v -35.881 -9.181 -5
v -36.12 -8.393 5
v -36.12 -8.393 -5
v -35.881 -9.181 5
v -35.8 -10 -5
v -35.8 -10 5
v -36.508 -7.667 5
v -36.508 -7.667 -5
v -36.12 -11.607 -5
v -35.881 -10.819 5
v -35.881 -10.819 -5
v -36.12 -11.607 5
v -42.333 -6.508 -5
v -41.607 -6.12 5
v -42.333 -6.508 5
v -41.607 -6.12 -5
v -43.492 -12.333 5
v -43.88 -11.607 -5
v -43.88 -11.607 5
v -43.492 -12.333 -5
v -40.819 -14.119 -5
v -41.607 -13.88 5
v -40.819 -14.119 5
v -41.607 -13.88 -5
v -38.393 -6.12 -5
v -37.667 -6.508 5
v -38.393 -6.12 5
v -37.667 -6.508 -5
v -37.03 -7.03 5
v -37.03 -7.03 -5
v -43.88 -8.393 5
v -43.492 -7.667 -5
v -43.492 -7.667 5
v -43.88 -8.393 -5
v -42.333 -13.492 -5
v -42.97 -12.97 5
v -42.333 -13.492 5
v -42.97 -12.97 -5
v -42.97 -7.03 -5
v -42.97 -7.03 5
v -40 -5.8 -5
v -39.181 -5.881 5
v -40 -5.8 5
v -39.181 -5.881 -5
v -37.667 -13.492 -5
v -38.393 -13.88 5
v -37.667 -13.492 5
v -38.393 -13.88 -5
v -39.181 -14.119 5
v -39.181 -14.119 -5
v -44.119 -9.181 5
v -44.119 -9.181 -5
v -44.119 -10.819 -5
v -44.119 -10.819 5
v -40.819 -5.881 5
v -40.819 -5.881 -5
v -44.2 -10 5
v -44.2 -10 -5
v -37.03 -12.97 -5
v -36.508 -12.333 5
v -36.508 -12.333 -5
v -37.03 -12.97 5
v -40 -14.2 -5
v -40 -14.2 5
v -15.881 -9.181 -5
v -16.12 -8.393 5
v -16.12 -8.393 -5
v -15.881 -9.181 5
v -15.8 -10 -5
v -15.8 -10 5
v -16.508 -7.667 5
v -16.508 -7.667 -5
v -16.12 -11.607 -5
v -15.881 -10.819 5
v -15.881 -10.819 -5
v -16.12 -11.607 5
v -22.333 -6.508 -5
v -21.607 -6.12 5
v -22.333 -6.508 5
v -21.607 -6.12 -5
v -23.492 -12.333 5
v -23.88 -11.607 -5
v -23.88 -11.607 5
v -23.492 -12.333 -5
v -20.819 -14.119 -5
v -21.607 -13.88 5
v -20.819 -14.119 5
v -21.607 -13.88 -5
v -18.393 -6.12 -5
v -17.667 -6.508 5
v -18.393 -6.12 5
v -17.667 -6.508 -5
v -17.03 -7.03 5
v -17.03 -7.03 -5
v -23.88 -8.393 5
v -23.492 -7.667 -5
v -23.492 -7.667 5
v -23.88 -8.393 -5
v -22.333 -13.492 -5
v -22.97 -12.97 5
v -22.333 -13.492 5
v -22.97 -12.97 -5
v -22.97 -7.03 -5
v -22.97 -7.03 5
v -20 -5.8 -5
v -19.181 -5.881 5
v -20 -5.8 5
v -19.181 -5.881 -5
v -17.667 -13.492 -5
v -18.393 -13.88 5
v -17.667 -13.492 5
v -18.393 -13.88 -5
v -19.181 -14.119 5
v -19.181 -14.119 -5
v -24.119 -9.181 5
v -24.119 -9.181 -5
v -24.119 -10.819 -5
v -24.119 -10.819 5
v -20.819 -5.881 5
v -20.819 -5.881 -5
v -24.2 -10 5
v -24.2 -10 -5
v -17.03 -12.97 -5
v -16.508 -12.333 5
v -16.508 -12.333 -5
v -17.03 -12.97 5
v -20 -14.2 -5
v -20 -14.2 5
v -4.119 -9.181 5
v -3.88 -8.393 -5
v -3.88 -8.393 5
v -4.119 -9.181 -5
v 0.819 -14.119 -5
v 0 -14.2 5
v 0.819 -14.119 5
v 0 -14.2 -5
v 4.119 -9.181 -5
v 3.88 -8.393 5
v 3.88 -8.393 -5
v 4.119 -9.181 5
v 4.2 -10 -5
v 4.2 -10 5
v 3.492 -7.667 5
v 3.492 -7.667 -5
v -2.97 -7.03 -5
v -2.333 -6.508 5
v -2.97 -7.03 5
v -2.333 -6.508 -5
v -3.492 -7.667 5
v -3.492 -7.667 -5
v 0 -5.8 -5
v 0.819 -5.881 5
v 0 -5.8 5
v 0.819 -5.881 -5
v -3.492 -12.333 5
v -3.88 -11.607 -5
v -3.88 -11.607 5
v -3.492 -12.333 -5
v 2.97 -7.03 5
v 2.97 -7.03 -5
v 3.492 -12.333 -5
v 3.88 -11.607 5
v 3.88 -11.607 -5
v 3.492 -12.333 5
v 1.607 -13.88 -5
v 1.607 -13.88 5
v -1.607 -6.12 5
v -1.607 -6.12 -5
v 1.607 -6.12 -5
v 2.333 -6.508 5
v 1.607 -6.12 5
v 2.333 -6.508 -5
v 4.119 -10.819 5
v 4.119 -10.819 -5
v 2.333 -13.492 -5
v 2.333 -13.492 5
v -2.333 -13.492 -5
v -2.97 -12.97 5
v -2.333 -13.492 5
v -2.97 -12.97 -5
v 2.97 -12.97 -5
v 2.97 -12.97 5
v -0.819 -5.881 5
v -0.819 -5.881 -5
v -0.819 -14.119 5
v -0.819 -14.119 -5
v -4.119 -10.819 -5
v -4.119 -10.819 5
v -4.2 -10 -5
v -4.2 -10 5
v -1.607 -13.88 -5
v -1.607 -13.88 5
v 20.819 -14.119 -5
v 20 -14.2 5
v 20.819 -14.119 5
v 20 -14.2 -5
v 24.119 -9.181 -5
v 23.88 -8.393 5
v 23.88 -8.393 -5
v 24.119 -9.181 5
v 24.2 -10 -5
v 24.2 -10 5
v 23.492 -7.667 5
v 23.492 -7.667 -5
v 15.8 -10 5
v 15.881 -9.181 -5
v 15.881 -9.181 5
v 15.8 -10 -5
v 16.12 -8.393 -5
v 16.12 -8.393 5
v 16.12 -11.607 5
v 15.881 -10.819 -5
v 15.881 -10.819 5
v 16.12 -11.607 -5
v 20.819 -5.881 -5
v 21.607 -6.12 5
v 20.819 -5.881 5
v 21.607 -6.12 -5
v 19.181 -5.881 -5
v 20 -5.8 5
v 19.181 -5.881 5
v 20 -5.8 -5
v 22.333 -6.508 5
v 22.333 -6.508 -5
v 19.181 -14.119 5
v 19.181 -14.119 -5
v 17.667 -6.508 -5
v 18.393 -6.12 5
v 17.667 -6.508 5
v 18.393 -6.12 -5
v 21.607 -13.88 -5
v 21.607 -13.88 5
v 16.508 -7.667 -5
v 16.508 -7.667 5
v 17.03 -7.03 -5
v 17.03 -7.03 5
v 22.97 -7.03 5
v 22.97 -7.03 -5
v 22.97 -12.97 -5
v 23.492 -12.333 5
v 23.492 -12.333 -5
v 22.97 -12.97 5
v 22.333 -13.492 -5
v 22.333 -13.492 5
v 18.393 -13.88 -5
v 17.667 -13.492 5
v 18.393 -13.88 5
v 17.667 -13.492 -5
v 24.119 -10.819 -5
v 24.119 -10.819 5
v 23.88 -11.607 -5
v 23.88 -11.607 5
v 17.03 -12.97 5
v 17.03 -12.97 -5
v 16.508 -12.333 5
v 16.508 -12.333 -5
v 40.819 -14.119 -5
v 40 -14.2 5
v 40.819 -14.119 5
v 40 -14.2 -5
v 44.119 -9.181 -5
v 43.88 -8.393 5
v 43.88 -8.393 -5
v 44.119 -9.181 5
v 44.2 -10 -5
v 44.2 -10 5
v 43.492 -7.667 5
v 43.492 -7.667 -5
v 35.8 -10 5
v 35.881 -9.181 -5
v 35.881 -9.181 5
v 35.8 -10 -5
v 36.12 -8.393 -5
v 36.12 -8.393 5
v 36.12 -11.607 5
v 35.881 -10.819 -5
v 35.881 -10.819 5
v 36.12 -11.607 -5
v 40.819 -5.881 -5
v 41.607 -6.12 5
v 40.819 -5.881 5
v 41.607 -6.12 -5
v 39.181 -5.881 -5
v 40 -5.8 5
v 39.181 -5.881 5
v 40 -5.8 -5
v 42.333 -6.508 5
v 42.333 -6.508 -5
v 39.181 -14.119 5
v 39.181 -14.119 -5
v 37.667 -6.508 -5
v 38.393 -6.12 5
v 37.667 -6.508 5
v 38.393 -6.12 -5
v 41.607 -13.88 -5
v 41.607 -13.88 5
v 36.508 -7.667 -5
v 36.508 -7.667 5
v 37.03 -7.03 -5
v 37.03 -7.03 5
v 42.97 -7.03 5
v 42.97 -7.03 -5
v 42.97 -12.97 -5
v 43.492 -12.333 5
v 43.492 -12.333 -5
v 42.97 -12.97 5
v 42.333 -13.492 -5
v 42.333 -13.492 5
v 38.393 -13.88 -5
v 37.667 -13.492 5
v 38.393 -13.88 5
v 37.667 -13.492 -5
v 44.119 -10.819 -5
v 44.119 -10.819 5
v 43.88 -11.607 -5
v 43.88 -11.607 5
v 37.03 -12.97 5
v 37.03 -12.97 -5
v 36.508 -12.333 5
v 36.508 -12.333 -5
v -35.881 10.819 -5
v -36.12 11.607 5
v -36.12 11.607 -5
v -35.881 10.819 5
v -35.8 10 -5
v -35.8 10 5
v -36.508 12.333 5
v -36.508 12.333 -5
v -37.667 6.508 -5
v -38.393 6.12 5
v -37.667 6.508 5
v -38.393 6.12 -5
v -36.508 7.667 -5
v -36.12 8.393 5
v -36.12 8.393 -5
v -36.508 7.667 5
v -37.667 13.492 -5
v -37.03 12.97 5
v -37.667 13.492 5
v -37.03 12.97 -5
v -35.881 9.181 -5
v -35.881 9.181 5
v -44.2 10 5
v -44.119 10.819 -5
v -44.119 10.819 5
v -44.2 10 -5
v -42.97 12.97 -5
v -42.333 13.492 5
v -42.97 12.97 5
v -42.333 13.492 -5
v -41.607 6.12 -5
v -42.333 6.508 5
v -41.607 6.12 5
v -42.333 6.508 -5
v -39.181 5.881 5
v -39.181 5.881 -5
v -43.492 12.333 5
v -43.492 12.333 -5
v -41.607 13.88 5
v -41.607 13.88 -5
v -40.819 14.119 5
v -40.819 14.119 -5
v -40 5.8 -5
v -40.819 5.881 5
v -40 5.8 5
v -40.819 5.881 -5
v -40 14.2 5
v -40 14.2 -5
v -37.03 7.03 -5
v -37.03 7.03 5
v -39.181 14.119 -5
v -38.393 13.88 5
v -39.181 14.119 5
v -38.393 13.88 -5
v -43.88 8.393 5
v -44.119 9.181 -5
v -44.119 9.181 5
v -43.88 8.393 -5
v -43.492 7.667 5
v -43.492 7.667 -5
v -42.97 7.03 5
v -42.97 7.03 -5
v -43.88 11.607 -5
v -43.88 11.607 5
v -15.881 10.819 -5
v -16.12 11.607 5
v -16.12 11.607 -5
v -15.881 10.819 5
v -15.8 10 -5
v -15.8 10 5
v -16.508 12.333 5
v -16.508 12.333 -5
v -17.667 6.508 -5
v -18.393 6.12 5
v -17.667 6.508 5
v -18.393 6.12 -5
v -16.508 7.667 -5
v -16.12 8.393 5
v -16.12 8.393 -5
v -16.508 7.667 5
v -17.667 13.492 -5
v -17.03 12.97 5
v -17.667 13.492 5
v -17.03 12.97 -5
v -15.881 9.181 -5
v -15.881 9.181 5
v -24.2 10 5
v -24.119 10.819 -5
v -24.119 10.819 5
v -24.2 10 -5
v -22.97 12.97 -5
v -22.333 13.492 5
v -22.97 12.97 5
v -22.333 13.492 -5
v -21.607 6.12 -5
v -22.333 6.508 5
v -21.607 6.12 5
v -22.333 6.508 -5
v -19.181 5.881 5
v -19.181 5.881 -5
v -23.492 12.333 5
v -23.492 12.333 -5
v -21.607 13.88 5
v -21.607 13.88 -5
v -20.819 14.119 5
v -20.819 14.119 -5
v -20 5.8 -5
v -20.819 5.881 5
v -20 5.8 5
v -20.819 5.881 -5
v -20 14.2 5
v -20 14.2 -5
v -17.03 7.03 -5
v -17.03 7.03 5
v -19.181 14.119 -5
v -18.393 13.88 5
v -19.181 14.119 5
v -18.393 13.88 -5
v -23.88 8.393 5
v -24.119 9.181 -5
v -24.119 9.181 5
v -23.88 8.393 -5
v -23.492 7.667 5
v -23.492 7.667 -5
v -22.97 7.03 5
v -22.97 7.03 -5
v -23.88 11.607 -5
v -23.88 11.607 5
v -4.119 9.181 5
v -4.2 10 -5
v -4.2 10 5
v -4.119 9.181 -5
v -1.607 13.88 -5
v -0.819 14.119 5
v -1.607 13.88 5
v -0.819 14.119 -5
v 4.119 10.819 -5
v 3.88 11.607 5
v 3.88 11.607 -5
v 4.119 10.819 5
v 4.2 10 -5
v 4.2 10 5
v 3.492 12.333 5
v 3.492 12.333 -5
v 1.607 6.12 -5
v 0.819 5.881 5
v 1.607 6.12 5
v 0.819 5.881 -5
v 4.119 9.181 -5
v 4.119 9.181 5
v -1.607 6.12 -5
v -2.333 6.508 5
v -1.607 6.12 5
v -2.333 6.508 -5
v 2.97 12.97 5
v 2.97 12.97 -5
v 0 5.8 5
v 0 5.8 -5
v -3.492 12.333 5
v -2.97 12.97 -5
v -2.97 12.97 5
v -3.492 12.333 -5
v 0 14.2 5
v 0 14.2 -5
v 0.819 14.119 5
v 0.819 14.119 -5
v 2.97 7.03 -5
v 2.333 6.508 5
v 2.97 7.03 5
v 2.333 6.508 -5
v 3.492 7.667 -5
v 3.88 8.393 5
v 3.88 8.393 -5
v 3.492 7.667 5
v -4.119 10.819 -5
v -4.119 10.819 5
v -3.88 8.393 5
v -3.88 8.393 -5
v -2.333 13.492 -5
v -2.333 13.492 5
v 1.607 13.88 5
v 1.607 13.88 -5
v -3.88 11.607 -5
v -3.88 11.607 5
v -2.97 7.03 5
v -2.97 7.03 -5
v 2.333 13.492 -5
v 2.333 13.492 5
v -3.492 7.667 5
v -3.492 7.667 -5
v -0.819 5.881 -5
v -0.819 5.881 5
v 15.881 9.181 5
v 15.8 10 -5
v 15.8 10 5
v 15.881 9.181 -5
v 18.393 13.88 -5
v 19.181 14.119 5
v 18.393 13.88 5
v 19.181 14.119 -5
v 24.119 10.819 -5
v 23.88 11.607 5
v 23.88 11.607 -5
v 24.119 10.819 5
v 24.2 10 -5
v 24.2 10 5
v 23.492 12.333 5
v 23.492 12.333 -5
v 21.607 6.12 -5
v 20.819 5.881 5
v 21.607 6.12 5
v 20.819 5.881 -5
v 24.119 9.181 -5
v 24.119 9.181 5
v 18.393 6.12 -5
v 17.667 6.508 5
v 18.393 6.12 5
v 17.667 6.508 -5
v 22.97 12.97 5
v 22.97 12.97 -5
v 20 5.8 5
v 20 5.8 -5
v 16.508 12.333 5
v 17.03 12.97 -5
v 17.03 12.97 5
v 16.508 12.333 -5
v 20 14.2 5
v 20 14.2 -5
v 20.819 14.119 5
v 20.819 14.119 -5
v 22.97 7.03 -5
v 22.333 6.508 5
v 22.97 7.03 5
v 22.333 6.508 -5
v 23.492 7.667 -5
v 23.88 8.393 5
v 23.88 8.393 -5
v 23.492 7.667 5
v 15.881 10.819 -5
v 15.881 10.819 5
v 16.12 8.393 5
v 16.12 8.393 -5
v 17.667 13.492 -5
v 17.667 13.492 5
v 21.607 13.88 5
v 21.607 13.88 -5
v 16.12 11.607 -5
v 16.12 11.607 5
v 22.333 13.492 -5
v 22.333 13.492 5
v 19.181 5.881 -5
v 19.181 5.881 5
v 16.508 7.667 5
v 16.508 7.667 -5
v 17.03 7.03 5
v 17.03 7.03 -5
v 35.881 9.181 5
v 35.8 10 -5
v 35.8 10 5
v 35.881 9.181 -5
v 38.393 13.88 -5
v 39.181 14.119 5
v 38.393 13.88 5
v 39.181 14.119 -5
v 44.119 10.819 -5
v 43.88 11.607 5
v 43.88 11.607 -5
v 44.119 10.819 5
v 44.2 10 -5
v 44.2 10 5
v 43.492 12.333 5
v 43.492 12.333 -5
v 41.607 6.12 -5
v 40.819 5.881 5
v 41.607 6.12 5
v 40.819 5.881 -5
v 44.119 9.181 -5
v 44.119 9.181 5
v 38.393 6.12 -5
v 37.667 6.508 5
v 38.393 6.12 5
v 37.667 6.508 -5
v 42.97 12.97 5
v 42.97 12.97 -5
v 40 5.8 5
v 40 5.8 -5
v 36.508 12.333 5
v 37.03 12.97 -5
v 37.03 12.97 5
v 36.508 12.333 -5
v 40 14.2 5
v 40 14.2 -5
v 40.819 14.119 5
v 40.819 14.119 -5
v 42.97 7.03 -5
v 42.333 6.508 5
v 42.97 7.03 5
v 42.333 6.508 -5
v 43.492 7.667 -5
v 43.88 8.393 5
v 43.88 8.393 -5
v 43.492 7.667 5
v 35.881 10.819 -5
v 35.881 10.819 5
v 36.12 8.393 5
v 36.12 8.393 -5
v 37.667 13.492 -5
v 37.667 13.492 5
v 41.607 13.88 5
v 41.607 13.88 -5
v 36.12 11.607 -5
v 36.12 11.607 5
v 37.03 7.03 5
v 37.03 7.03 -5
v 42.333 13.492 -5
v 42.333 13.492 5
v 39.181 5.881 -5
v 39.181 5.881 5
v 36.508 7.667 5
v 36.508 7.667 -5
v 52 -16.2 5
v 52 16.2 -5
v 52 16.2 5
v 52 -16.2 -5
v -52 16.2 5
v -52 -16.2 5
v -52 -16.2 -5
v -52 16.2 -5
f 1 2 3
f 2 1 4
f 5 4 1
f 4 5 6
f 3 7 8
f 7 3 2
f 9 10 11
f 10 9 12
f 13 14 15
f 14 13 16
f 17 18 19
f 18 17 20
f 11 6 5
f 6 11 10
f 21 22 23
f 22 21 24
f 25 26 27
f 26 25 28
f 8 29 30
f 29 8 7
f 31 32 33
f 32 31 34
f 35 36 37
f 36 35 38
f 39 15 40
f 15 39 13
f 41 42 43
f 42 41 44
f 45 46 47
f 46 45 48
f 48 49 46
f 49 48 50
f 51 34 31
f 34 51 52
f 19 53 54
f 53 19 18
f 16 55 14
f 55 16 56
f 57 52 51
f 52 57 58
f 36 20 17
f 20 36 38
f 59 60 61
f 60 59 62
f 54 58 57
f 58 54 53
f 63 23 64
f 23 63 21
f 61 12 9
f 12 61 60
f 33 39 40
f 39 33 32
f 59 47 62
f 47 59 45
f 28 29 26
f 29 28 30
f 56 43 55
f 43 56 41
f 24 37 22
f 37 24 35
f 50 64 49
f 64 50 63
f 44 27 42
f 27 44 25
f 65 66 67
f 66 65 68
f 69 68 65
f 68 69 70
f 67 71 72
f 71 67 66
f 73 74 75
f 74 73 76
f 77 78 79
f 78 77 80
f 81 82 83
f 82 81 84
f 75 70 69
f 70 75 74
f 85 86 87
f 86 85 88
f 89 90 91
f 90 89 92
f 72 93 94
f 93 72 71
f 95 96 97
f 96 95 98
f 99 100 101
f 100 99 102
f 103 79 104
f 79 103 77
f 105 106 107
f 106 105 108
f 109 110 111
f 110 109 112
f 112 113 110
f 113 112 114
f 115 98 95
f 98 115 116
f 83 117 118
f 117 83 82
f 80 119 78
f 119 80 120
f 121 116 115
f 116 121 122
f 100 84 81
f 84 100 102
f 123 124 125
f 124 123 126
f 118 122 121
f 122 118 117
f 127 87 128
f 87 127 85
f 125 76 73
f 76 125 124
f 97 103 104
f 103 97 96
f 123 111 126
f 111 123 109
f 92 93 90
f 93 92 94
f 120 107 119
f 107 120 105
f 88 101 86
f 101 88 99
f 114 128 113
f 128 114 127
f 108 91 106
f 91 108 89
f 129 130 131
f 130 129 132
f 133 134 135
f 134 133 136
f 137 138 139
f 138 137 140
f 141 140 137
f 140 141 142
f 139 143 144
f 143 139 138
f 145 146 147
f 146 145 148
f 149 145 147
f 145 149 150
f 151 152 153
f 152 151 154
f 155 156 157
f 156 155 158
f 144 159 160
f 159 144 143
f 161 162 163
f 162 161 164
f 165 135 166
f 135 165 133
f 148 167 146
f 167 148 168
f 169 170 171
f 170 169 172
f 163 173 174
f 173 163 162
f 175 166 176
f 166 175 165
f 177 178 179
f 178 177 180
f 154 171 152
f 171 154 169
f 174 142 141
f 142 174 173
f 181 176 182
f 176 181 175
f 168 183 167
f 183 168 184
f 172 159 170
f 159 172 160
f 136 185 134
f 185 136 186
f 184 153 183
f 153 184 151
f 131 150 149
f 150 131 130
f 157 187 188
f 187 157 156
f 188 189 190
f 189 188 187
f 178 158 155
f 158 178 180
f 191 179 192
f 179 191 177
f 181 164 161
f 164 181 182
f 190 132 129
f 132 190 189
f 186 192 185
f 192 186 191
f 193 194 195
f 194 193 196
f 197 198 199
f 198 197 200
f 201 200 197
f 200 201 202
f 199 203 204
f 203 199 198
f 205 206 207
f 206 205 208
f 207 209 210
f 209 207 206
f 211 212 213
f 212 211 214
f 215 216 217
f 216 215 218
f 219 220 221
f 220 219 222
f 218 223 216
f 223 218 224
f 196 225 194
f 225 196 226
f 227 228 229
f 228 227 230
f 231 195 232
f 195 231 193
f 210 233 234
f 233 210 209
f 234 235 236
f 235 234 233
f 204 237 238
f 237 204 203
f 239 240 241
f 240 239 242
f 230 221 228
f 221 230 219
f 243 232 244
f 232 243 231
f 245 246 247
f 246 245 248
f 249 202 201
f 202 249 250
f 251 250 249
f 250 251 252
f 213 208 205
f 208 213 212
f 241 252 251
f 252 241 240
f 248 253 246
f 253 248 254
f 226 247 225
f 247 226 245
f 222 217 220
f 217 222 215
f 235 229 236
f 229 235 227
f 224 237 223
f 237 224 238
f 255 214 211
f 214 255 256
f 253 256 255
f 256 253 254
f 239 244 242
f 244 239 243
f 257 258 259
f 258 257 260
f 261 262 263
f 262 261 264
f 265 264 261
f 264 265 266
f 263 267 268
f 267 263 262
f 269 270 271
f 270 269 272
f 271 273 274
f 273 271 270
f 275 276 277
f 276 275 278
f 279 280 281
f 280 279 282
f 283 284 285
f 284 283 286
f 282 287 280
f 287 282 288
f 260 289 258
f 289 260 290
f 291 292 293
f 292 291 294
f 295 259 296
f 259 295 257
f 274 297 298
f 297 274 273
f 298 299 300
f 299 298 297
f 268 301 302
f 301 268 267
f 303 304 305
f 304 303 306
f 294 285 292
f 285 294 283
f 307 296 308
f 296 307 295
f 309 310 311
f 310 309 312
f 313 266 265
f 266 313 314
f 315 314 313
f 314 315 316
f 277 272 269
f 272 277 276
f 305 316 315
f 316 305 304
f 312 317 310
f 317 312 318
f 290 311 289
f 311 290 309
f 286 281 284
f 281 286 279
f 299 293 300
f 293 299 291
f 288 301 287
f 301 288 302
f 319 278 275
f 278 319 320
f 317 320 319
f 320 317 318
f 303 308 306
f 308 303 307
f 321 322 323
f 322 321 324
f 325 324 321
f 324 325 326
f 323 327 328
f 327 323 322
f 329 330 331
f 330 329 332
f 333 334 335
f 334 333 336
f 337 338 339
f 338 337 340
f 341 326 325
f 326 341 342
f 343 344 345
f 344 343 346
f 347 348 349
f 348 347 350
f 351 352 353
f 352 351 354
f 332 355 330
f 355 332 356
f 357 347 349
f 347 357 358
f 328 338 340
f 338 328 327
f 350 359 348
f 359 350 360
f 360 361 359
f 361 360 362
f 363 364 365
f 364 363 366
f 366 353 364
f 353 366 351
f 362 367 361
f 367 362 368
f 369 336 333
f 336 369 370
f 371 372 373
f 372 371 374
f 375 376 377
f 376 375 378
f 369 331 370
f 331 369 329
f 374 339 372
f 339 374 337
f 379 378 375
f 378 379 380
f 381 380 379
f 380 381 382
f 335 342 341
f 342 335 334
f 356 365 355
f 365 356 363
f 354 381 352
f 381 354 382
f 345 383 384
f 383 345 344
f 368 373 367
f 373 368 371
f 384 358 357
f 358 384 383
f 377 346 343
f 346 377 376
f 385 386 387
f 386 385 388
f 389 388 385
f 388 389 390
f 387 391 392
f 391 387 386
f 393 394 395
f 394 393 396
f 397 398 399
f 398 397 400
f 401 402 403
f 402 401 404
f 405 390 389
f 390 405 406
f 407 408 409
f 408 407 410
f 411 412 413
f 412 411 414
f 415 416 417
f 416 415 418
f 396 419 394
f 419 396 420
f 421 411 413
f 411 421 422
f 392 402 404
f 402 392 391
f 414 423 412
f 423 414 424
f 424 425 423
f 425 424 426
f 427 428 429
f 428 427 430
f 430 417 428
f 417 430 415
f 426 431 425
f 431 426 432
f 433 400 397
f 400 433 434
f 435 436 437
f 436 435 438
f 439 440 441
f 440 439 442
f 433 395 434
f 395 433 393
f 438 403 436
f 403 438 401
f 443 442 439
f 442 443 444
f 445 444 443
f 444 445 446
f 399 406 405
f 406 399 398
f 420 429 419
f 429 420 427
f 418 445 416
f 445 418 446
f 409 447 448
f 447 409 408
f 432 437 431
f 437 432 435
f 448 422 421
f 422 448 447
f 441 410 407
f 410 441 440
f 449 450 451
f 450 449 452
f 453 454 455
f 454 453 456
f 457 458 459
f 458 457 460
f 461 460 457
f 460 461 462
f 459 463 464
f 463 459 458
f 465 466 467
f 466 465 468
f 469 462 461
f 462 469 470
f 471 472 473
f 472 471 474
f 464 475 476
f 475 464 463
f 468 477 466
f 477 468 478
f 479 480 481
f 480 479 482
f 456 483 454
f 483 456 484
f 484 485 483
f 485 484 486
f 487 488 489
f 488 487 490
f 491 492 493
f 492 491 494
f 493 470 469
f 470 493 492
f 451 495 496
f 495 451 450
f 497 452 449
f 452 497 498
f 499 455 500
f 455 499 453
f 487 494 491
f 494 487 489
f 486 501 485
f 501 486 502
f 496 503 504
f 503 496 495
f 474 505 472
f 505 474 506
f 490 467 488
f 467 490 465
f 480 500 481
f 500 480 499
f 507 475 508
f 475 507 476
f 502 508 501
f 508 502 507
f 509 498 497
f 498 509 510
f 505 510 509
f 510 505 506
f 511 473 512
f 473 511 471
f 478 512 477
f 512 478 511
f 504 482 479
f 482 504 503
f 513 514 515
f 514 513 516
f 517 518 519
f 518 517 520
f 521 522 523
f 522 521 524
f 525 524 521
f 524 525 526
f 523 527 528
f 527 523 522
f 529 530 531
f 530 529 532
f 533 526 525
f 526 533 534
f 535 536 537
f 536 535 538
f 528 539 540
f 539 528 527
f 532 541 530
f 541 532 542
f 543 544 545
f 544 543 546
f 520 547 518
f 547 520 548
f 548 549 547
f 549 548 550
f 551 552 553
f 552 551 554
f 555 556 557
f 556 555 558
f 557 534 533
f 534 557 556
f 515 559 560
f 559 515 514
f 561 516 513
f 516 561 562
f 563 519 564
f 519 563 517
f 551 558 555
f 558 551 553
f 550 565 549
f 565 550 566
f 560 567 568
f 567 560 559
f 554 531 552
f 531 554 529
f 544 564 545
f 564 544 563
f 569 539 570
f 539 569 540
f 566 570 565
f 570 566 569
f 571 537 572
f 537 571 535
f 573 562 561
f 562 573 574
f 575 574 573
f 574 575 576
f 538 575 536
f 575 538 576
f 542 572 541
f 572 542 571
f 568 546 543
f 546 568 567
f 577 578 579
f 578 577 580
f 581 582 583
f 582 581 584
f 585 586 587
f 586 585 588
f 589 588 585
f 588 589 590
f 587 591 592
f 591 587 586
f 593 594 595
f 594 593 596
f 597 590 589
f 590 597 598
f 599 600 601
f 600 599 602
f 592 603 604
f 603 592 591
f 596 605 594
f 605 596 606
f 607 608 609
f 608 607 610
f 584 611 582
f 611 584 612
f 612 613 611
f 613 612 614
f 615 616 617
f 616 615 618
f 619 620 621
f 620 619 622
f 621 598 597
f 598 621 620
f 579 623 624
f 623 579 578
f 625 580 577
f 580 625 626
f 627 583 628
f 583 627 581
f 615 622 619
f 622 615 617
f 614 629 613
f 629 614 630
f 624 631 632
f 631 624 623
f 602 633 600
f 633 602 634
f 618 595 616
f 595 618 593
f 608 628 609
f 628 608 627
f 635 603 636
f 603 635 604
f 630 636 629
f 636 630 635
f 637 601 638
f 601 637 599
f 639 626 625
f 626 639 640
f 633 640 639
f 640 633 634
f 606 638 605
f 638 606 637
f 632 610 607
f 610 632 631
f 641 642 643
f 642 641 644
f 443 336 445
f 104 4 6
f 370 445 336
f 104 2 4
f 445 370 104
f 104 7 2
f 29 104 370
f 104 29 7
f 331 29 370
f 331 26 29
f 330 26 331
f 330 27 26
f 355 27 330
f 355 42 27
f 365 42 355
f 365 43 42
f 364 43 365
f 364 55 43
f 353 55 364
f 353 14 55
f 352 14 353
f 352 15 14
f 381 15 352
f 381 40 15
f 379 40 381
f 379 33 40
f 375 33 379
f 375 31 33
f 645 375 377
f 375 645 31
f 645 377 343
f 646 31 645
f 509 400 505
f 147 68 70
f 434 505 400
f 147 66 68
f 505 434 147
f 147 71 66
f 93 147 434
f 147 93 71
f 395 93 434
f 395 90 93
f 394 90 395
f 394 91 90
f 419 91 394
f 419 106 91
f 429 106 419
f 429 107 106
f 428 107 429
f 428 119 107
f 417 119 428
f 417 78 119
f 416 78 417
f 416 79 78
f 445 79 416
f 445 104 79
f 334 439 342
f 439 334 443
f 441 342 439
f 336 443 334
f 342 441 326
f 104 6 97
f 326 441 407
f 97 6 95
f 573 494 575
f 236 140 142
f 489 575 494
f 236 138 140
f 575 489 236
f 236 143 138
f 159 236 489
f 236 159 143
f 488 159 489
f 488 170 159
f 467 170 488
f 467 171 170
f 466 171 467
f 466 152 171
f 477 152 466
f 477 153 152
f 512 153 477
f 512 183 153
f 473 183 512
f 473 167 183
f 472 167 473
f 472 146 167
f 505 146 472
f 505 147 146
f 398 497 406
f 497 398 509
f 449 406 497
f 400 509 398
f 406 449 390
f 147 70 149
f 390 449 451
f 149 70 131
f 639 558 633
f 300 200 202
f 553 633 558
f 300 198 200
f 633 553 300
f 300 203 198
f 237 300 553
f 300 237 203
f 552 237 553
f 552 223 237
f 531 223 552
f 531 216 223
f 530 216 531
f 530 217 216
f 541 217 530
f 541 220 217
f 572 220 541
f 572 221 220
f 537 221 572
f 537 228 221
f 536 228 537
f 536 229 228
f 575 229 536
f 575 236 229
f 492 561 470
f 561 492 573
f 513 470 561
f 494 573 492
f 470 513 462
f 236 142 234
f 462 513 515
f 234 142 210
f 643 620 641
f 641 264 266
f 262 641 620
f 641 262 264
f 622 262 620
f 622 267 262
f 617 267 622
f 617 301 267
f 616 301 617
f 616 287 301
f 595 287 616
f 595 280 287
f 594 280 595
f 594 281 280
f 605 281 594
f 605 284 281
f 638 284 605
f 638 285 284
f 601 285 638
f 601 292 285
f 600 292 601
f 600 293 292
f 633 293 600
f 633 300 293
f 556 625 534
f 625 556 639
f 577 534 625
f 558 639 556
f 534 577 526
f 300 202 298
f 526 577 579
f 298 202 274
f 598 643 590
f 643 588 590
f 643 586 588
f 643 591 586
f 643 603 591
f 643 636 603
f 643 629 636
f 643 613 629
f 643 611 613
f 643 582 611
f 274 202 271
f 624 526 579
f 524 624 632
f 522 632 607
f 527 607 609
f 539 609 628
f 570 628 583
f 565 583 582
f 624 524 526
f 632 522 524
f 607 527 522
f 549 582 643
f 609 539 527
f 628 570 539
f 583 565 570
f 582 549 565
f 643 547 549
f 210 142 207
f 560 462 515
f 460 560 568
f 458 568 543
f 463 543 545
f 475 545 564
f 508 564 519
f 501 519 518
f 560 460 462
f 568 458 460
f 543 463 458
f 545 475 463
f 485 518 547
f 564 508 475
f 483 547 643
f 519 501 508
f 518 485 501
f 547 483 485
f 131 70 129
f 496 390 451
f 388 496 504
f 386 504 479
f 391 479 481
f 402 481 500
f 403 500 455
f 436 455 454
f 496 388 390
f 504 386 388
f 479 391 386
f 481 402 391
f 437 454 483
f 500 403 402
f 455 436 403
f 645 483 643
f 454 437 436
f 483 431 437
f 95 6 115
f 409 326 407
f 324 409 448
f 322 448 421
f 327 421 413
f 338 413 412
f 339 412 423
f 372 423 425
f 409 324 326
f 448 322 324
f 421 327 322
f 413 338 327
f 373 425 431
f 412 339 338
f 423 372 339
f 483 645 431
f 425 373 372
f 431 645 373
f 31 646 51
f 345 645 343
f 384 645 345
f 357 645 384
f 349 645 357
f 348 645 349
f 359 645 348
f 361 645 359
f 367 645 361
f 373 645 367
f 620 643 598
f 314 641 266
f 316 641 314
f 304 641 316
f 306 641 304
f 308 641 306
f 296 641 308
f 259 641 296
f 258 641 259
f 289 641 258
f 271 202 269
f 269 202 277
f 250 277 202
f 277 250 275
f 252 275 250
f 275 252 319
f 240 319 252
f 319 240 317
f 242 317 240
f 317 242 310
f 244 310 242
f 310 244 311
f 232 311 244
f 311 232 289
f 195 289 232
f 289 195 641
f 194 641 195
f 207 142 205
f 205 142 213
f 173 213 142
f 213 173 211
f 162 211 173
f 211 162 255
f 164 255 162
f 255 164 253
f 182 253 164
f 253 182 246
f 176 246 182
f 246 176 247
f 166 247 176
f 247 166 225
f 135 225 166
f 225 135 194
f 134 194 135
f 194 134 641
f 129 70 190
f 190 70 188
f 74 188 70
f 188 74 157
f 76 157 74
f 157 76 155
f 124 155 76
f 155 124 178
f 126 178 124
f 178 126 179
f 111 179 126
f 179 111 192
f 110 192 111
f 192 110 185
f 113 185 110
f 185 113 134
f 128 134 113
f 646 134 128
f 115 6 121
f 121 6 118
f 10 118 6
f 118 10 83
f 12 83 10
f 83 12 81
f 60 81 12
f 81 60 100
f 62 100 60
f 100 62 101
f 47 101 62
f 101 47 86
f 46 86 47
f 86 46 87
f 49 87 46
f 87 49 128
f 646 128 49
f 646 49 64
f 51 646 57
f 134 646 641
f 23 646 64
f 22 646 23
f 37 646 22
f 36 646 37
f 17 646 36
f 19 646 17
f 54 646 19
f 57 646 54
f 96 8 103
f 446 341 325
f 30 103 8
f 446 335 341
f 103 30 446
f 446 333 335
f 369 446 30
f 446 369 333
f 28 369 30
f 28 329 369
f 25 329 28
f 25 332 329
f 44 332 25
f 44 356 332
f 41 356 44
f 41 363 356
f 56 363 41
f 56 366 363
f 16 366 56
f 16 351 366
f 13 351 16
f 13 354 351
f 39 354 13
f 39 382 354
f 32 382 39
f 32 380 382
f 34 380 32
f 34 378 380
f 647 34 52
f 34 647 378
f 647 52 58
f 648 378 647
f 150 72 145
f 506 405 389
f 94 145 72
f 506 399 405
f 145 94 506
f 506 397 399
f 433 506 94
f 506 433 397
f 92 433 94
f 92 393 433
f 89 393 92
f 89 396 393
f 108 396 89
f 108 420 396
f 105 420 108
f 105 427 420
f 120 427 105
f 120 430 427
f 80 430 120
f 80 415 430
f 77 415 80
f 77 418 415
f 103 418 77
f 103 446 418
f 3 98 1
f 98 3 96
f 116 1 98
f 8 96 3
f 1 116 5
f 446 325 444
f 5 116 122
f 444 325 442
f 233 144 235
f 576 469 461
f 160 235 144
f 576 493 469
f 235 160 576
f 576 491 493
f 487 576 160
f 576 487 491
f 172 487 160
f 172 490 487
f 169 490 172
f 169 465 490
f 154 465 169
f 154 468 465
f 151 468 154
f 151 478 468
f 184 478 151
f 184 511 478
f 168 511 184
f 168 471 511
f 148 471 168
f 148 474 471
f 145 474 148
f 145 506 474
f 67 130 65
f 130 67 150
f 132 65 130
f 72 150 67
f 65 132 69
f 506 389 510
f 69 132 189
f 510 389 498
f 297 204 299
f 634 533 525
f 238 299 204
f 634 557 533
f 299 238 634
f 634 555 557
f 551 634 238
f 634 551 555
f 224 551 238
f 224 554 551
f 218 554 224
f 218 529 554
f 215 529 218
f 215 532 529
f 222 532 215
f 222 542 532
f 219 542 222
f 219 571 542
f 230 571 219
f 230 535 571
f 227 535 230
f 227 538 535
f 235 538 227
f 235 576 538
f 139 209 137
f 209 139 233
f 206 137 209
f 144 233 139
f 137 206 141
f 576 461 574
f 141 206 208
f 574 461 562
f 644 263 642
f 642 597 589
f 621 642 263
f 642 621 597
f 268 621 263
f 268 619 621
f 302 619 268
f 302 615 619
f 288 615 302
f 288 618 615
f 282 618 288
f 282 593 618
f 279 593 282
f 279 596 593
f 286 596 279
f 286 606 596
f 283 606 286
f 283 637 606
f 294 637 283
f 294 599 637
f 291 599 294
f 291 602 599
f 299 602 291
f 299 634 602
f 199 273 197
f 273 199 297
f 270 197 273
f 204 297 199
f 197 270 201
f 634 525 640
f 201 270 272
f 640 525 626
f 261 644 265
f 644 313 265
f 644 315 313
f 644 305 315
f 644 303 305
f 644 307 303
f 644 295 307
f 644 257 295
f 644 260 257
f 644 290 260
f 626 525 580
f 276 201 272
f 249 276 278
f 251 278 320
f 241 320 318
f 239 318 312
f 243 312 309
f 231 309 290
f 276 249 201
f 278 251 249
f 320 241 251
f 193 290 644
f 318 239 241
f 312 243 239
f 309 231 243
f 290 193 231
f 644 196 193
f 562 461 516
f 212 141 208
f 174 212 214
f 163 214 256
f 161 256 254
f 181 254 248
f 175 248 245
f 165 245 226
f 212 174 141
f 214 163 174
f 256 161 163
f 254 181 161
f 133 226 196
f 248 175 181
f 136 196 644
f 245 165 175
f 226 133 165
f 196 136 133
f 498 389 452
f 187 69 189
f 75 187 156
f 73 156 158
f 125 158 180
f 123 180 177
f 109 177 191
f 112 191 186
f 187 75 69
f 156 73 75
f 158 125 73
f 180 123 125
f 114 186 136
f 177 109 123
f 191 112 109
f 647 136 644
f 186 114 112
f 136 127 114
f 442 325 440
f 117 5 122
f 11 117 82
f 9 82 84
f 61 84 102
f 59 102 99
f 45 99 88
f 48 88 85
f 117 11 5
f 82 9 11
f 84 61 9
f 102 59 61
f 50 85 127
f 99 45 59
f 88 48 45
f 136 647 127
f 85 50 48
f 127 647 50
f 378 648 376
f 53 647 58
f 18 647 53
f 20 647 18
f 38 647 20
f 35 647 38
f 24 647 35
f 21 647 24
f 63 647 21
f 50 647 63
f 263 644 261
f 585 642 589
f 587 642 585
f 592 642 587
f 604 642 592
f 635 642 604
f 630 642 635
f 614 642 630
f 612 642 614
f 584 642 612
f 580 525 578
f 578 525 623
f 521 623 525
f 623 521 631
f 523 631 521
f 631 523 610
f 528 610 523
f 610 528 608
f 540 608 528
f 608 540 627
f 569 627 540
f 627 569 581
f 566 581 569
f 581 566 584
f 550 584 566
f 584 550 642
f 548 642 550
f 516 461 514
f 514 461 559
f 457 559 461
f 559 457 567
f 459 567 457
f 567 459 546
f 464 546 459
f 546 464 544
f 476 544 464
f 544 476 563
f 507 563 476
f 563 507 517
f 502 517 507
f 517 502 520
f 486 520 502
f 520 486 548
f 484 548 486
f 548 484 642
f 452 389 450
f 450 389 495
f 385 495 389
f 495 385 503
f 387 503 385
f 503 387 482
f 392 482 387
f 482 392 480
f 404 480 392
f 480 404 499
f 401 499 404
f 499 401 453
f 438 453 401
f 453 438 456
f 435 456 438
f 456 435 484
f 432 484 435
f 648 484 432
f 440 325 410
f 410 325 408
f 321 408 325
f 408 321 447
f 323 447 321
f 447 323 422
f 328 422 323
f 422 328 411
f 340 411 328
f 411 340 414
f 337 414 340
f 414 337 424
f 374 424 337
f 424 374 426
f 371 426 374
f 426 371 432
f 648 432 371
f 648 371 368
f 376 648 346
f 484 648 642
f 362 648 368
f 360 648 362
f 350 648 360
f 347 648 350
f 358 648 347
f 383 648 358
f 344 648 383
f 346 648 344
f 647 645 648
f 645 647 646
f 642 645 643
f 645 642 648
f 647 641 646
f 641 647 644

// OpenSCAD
$fn = 32;

// ----------------------------------------------------------------------
// Hole bar, 5 x Ø8.4
// tworows layout, 12 mm edge offset
// ----------------------------------------------------------------------

// --- parameters (mm) ---
bar_w = 32.4;     // bar width (Y)
bar_t = 10;       // bar thickness (Z)
holes = 5;        // holes per row
hole_d = 8.4;     // hole diameter
edge = 12;        // offset from the bar end to the first hole
pitch = 20;       // pitch between neighbouring holes
row_offset = 20;  // distance between the two rows

// --- derived feature positions (mm) ---
span = (holes - 1) * pitch;   // = 80   distance between the end holes
bar_l = span + 2 * edge;      // = 104   overall bar length
start_x = -bar_l / 2 + edge;  // = -40   X of the first hole
feature_centers = [
  [start_x + 0 * pitch, -row_offset / 2],
  [start_x + 1 * pitch, -row_offset / 2],
  [start_x + 2 * pitch, -row_offset / 2],
  [start_x + 3 * pitch, -row_offset / 2],
  [start_x + 4 * pitch, -row_offset / 2]
];   // hole centres of the first row
row2_centers = [
  [start_x + 0 * pitch, row_offset / 2],
  [start_x + 1 * pitch, row_offset / 2],
  [start_x + 2 * pitch, row_offset / 2],
  [start_x + 3 * pitch, row_offset / 2],
  [start_x + 4 * pitch, row_offset / 2]
];   // hole centres of the second row

// bar with two rows of holes, both read from their own centre arrays
difference() {
  translate([-bar_l / 2, -bar_w / 2, -bar_t / 2]) cube([bar_l, bar_w, bar_t]);
  for (centre = feature_centers)
    translate([centre[0], centre[1], 0])
      cylinder(d = hole_d, h = bar_t + 2, center = true);
  for (centre = row2_centers)
    translate([centre[0], centre[1], 0])
      cylinder(d = hole_d, h = bar_t + 2, center = true);
}
